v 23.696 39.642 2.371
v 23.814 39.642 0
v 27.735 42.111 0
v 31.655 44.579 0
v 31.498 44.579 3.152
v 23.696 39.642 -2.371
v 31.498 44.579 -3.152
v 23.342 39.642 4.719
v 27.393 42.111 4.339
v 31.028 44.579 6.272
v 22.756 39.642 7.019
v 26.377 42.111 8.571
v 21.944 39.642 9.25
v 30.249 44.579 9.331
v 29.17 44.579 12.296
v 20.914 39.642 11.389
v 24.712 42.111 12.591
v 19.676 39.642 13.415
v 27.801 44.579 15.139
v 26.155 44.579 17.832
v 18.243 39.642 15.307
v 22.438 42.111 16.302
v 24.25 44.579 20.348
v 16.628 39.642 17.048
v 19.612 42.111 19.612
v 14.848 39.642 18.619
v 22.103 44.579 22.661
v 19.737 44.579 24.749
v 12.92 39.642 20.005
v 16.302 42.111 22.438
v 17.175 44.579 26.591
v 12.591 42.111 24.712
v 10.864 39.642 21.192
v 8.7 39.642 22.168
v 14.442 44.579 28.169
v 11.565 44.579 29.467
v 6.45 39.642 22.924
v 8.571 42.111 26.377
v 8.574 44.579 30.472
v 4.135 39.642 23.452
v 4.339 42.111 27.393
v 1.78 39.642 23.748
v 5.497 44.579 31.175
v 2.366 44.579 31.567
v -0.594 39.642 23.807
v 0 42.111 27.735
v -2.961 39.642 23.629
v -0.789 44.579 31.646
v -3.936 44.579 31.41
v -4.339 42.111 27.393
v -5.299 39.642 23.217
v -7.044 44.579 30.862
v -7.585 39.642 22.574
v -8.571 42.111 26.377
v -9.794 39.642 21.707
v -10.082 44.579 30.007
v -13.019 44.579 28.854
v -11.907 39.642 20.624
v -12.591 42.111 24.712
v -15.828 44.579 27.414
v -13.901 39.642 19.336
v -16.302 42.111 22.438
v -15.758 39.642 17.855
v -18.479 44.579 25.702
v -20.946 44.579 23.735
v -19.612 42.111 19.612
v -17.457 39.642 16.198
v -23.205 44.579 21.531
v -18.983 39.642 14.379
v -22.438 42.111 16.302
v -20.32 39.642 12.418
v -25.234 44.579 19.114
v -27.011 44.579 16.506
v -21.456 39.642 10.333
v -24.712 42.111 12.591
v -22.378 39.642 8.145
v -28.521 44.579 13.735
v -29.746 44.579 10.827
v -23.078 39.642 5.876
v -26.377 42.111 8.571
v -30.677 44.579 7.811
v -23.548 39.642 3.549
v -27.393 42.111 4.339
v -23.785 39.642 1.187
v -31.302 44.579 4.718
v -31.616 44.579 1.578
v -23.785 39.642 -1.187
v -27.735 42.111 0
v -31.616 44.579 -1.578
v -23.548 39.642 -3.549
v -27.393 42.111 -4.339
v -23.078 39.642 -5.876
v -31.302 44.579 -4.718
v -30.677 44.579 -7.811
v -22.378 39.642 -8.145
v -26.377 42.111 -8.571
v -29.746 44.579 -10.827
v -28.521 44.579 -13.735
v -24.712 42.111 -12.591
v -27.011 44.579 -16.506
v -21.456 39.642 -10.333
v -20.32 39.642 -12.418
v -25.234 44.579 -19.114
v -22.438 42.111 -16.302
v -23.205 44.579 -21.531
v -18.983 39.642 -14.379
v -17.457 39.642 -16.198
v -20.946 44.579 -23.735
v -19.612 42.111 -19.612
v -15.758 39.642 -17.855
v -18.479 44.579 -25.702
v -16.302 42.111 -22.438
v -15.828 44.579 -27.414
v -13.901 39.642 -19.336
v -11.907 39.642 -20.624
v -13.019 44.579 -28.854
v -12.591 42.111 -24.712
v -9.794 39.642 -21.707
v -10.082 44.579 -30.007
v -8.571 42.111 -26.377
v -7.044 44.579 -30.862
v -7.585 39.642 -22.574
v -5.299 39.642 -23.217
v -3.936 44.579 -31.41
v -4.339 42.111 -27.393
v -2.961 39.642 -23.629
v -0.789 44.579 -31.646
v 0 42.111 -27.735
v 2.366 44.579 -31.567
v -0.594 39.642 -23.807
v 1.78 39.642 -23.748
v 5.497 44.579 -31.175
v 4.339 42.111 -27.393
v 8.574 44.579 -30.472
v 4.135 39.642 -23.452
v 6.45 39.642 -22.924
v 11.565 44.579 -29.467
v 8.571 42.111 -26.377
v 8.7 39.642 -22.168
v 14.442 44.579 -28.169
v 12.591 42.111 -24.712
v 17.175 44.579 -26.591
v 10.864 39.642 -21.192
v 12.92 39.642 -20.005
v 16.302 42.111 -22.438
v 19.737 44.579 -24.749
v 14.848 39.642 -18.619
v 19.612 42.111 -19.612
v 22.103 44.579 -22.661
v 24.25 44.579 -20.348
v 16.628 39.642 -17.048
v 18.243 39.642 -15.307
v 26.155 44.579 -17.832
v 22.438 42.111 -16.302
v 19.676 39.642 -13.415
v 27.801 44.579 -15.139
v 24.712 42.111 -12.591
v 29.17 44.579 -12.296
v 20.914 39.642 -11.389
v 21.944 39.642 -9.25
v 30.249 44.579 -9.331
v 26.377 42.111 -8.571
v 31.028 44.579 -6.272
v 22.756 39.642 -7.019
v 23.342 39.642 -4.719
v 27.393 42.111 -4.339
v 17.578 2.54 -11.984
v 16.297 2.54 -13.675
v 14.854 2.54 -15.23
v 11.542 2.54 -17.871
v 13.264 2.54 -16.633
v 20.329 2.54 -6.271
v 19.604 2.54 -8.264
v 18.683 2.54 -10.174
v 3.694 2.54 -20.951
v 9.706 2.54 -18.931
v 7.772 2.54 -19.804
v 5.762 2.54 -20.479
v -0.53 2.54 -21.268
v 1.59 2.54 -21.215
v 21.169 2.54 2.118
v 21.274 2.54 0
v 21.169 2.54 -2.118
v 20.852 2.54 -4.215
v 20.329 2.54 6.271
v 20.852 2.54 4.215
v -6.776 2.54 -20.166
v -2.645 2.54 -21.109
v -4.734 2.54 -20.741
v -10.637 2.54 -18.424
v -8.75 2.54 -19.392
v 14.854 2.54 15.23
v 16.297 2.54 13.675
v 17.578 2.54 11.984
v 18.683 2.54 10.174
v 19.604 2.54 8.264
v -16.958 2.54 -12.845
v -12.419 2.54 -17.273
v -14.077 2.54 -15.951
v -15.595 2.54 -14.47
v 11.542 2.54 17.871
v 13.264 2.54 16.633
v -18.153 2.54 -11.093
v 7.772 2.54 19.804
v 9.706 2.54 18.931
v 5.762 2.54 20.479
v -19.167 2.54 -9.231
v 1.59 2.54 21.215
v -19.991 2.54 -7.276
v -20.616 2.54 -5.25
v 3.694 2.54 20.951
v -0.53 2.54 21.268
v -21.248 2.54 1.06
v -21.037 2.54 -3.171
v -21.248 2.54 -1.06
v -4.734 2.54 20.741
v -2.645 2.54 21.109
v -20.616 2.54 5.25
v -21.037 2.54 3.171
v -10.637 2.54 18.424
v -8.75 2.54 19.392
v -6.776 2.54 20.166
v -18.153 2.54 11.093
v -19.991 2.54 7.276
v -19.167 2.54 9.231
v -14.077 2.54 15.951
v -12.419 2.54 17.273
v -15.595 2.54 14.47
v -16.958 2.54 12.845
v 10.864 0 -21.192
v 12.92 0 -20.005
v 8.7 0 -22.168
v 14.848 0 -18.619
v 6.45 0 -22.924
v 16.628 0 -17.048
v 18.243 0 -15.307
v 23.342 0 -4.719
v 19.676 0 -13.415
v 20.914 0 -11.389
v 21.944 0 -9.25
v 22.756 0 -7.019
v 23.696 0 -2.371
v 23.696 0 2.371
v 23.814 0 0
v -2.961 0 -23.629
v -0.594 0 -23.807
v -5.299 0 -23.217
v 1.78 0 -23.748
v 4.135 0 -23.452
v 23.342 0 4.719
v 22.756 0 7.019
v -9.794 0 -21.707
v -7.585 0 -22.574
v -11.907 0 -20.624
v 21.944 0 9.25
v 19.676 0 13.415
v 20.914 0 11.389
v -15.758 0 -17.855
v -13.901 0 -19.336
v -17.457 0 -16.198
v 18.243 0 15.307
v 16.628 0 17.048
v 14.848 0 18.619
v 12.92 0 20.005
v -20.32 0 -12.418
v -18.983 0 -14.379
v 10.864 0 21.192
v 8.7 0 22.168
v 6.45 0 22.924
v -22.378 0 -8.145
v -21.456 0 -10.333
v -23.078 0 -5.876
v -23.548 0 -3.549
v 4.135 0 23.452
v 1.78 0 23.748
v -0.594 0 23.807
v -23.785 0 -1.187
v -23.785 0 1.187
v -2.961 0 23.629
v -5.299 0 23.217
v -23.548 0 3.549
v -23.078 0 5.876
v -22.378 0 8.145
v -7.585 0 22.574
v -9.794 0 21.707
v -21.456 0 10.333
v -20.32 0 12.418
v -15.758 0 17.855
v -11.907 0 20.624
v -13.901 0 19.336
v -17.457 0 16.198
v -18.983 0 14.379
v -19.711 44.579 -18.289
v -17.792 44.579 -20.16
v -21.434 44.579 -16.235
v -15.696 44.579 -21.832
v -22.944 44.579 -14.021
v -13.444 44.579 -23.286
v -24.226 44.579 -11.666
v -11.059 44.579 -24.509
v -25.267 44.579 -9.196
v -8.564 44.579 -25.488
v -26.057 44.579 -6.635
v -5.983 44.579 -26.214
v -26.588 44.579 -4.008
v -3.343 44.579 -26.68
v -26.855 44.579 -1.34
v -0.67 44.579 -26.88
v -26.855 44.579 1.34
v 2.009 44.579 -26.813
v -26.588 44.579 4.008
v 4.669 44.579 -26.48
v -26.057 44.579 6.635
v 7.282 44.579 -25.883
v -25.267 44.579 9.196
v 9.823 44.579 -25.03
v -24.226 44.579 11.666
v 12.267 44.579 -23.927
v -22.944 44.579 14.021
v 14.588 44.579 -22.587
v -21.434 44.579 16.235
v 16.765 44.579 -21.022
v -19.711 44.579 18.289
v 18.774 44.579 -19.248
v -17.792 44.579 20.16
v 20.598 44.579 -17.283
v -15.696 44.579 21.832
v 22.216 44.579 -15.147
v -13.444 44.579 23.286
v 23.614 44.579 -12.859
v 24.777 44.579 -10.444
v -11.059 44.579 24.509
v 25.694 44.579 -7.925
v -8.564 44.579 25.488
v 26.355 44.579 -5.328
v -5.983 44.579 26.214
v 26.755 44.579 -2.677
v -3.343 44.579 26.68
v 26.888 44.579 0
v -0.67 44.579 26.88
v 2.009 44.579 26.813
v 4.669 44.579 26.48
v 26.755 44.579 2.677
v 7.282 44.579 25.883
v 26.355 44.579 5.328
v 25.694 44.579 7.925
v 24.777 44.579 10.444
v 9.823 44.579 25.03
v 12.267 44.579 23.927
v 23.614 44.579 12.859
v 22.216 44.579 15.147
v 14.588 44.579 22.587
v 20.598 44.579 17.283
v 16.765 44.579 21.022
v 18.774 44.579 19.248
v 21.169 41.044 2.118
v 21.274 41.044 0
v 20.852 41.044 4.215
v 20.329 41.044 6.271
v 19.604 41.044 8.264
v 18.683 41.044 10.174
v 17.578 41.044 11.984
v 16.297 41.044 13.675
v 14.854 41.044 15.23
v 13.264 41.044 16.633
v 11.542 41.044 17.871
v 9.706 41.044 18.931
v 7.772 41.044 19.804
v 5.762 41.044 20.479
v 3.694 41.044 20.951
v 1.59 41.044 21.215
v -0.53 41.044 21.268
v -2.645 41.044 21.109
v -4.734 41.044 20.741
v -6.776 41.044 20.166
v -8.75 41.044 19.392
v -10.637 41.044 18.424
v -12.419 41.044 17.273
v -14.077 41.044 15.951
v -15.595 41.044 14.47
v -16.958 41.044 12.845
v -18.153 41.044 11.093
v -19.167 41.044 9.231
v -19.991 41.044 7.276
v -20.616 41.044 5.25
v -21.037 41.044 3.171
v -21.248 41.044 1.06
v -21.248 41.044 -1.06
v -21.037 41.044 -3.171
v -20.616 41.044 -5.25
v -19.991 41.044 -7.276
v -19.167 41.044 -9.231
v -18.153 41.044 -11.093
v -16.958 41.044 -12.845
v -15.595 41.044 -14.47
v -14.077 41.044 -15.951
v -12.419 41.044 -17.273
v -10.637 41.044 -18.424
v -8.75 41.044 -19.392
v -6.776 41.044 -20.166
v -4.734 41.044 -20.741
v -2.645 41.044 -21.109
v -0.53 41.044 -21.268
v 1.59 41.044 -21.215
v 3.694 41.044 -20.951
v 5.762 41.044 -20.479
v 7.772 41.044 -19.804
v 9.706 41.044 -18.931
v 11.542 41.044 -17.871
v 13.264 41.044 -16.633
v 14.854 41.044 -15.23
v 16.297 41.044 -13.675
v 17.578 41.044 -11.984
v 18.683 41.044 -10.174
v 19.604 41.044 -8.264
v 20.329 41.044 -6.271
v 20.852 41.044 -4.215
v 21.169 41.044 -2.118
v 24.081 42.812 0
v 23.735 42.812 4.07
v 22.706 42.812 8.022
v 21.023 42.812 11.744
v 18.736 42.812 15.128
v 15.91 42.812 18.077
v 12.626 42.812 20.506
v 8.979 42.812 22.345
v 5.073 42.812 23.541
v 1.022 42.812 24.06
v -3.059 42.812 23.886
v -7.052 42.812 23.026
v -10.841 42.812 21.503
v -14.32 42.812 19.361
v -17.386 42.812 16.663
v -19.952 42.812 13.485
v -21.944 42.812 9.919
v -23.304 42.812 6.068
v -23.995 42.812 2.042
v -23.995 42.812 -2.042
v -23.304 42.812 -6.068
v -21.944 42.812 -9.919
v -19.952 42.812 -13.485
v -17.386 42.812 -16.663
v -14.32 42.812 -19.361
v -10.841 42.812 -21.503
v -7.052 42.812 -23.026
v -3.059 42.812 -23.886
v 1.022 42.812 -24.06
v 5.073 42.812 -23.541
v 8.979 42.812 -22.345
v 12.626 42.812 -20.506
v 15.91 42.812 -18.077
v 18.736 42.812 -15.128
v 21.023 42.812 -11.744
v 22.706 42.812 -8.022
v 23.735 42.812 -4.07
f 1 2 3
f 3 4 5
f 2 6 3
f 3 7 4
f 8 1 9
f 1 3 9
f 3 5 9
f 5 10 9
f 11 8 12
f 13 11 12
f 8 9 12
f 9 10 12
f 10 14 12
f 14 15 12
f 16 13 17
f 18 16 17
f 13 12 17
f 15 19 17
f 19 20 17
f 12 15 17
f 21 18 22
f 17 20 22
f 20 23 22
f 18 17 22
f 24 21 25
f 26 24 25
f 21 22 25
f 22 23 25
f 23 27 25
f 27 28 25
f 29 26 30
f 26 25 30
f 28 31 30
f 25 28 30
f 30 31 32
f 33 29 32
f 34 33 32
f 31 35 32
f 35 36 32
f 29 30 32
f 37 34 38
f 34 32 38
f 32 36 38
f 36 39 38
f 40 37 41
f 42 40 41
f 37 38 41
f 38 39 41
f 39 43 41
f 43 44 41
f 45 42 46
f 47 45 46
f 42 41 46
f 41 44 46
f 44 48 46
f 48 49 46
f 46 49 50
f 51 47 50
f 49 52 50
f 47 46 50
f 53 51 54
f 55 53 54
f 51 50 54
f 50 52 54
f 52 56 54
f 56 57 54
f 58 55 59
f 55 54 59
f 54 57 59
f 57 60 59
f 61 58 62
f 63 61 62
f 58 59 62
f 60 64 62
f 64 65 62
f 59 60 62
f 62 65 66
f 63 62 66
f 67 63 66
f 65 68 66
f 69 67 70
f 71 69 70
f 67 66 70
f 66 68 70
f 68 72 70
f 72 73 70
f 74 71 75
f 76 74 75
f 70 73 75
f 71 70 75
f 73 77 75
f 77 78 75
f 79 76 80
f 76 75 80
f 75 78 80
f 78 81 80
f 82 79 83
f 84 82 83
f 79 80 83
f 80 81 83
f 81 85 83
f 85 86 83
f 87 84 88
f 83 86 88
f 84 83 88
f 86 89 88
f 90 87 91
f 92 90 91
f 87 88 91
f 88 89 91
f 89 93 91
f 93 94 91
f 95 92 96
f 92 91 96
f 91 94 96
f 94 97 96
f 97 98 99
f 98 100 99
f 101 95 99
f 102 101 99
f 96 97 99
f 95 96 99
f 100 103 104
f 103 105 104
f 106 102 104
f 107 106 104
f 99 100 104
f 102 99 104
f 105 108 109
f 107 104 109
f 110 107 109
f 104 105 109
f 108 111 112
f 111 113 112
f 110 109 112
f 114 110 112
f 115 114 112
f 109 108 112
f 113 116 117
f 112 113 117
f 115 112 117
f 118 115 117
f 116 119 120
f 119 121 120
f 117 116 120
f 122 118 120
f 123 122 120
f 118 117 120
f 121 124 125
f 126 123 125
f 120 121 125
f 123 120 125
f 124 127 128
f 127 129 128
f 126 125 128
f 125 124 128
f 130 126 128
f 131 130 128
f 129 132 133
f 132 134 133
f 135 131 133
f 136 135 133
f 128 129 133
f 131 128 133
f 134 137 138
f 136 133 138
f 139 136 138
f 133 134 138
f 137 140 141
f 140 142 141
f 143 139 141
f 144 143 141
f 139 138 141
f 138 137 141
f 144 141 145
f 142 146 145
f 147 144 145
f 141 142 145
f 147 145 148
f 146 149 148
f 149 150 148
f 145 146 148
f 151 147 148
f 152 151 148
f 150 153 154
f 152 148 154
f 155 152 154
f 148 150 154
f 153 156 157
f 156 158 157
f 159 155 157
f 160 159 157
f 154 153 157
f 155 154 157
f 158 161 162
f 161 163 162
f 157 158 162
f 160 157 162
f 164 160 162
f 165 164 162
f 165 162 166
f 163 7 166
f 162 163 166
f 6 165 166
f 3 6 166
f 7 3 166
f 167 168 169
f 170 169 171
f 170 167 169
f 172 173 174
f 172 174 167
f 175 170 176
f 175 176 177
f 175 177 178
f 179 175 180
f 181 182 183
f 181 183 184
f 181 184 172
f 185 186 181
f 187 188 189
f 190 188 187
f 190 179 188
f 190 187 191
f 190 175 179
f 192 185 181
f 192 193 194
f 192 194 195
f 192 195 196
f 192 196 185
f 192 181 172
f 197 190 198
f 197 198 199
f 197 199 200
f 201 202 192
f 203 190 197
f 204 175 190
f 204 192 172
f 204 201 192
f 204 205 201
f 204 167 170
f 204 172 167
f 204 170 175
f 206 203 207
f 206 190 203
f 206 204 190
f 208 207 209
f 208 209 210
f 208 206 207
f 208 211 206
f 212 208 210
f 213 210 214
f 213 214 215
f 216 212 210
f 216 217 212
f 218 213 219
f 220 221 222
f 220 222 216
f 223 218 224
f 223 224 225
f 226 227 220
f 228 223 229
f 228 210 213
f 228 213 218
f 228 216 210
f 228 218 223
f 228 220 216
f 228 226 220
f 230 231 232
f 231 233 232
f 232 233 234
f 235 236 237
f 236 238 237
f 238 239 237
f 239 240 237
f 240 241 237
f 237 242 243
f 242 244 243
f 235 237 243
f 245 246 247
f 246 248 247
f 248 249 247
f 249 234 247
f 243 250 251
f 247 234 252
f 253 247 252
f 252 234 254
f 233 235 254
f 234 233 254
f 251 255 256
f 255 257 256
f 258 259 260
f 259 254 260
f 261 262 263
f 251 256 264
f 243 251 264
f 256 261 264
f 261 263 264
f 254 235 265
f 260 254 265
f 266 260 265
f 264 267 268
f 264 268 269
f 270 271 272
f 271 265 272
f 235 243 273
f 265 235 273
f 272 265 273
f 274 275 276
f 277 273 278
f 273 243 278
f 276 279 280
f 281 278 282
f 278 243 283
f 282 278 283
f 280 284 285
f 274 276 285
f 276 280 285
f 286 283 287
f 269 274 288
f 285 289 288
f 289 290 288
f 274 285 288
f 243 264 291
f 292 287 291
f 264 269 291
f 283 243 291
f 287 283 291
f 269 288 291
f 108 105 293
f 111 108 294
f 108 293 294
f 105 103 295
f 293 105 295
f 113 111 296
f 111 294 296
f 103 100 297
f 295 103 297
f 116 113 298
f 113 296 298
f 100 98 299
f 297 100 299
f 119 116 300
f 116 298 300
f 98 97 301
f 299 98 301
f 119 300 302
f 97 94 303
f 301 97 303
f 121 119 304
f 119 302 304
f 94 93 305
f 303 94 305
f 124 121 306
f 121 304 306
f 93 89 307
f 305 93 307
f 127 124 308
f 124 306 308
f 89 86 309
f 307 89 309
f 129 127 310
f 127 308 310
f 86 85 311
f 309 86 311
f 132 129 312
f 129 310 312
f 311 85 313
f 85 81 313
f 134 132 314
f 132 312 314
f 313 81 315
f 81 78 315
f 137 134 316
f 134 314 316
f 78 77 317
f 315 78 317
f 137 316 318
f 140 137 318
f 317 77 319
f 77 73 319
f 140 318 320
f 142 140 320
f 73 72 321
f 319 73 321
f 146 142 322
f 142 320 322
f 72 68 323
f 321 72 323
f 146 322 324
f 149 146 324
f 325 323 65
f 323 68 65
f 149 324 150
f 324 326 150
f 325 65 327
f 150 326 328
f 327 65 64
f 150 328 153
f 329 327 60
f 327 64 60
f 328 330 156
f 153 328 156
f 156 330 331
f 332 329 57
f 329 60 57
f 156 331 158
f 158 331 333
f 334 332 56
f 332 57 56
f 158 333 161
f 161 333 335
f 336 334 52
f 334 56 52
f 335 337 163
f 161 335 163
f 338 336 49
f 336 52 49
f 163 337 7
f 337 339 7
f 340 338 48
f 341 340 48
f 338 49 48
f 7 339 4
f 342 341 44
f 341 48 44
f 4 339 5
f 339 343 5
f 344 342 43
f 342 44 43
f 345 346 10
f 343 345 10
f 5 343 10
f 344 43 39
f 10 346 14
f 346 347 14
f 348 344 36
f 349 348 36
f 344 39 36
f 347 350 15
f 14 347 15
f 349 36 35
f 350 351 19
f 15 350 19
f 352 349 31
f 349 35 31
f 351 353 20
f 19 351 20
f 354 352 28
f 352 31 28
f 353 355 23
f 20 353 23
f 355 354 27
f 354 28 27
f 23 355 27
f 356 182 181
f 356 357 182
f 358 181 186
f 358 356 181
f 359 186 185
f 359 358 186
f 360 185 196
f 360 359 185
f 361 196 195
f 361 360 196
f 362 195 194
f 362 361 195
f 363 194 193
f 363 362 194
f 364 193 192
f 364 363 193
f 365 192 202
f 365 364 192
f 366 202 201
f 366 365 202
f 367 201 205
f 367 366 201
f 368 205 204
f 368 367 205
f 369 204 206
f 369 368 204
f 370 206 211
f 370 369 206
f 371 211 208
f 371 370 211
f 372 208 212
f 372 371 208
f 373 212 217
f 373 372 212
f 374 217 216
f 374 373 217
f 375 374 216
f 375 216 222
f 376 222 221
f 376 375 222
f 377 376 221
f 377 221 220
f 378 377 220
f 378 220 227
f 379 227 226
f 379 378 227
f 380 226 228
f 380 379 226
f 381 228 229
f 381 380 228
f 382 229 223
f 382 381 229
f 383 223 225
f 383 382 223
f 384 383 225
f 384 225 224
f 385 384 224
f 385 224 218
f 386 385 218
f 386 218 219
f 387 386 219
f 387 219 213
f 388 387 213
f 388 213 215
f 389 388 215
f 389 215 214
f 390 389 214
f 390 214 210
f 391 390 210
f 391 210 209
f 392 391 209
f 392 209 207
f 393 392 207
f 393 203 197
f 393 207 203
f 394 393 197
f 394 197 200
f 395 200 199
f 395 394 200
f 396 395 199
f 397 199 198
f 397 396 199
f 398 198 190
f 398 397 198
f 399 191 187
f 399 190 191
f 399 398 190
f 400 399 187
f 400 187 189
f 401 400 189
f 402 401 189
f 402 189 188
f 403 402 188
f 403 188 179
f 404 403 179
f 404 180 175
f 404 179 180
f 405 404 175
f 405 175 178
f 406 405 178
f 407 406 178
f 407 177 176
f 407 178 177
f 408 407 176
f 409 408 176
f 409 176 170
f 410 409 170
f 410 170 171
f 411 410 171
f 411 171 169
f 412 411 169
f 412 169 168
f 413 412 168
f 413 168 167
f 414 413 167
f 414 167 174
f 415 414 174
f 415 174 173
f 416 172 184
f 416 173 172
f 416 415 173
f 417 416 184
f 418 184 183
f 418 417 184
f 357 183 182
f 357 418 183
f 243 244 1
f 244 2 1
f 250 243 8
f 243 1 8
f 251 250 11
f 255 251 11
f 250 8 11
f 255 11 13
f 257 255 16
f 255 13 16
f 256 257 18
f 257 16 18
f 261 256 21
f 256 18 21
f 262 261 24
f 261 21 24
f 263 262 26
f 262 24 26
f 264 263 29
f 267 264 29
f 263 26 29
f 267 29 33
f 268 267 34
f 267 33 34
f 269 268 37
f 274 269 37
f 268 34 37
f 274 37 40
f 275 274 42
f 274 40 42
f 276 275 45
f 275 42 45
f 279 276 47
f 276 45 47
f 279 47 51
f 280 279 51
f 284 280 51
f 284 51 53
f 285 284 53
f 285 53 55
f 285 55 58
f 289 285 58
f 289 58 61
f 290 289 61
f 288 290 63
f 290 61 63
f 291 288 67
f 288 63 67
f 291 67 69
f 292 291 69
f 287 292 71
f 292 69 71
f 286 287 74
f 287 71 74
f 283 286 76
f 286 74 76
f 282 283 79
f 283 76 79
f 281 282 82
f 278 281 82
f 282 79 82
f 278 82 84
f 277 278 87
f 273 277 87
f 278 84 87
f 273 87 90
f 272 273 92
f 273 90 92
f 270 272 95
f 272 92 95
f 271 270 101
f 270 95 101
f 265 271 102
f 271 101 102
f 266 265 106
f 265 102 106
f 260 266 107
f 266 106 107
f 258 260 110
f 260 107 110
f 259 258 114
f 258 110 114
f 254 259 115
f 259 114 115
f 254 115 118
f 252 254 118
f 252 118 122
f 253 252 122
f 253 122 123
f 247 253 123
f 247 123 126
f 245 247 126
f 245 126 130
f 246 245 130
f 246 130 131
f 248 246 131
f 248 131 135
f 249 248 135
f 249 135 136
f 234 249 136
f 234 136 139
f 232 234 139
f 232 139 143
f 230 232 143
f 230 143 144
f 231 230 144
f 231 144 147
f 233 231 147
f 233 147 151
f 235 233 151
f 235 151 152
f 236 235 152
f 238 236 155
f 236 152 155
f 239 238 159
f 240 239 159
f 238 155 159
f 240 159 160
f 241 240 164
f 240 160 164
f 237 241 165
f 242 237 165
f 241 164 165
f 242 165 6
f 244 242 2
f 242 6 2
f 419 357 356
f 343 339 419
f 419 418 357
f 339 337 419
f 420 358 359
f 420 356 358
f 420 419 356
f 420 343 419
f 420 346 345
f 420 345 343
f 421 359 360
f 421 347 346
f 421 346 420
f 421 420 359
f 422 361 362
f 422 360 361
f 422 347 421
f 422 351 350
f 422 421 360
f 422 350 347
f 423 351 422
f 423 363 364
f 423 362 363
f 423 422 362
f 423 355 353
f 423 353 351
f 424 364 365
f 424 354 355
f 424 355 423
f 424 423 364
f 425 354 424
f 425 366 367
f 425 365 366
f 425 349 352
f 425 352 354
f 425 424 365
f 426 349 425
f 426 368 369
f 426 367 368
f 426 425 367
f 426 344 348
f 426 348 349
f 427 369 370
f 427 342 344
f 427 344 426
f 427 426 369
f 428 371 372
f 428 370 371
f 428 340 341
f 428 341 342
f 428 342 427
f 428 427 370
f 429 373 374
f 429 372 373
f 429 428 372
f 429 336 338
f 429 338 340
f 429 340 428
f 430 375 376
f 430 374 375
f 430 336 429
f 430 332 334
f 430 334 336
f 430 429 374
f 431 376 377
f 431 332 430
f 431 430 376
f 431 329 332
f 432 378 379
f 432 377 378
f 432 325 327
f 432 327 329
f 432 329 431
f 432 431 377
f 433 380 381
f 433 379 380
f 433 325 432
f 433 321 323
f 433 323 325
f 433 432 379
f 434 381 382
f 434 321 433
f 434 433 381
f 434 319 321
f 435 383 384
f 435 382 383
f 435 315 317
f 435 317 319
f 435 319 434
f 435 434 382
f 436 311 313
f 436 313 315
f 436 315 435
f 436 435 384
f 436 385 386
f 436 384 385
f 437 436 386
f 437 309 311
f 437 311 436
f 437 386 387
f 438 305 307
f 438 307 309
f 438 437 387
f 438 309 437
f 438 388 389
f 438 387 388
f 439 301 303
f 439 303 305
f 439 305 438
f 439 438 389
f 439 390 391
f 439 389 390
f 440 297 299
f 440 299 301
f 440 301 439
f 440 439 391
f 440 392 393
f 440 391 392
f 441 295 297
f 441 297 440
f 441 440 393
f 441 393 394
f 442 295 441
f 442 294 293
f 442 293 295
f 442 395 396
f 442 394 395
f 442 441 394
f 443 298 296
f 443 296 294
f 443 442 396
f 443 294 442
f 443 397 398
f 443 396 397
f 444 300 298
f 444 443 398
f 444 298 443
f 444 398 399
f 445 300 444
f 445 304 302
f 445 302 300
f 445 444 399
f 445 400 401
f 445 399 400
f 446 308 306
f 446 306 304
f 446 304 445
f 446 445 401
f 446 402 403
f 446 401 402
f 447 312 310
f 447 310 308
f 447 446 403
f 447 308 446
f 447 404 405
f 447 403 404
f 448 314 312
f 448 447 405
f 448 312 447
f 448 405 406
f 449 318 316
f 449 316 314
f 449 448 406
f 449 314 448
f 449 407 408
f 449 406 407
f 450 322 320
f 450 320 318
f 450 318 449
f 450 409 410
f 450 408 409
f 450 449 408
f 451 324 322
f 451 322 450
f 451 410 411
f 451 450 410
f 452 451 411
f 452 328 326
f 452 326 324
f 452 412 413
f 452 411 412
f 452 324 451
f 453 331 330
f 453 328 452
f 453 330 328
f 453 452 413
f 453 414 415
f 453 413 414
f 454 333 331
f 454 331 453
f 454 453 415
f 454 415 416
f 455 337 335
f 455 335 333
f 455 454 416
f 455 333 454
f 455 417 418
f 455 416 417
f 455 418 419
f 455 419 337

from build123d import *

# Parameters (mm, degrees)
F2_T = -2.54


with BuildPart() as f1:
    # F0 (on Top) → F1 (revolve)
    with BuildSketch(Plane.XY):
        Polygon((31.655497849, 44.5790737867), (0, 44.5790737867), (0, 0), (23.8142292947, 0), (23.8142292947, 39.6419800818), align=None)
    revolve(axis=Axis((0, 22.2895368934, 0), (0, -1, 0)))

    # F2
    f2_openings = [f1.faces().sort_by_distance(p)[0] for p in [
        (0, 44.579074, 0),
    ]]
    offset(amount=F2_T, openings=f2_openings, kind=Kind.INTERSECTION)


solid = f1.part
